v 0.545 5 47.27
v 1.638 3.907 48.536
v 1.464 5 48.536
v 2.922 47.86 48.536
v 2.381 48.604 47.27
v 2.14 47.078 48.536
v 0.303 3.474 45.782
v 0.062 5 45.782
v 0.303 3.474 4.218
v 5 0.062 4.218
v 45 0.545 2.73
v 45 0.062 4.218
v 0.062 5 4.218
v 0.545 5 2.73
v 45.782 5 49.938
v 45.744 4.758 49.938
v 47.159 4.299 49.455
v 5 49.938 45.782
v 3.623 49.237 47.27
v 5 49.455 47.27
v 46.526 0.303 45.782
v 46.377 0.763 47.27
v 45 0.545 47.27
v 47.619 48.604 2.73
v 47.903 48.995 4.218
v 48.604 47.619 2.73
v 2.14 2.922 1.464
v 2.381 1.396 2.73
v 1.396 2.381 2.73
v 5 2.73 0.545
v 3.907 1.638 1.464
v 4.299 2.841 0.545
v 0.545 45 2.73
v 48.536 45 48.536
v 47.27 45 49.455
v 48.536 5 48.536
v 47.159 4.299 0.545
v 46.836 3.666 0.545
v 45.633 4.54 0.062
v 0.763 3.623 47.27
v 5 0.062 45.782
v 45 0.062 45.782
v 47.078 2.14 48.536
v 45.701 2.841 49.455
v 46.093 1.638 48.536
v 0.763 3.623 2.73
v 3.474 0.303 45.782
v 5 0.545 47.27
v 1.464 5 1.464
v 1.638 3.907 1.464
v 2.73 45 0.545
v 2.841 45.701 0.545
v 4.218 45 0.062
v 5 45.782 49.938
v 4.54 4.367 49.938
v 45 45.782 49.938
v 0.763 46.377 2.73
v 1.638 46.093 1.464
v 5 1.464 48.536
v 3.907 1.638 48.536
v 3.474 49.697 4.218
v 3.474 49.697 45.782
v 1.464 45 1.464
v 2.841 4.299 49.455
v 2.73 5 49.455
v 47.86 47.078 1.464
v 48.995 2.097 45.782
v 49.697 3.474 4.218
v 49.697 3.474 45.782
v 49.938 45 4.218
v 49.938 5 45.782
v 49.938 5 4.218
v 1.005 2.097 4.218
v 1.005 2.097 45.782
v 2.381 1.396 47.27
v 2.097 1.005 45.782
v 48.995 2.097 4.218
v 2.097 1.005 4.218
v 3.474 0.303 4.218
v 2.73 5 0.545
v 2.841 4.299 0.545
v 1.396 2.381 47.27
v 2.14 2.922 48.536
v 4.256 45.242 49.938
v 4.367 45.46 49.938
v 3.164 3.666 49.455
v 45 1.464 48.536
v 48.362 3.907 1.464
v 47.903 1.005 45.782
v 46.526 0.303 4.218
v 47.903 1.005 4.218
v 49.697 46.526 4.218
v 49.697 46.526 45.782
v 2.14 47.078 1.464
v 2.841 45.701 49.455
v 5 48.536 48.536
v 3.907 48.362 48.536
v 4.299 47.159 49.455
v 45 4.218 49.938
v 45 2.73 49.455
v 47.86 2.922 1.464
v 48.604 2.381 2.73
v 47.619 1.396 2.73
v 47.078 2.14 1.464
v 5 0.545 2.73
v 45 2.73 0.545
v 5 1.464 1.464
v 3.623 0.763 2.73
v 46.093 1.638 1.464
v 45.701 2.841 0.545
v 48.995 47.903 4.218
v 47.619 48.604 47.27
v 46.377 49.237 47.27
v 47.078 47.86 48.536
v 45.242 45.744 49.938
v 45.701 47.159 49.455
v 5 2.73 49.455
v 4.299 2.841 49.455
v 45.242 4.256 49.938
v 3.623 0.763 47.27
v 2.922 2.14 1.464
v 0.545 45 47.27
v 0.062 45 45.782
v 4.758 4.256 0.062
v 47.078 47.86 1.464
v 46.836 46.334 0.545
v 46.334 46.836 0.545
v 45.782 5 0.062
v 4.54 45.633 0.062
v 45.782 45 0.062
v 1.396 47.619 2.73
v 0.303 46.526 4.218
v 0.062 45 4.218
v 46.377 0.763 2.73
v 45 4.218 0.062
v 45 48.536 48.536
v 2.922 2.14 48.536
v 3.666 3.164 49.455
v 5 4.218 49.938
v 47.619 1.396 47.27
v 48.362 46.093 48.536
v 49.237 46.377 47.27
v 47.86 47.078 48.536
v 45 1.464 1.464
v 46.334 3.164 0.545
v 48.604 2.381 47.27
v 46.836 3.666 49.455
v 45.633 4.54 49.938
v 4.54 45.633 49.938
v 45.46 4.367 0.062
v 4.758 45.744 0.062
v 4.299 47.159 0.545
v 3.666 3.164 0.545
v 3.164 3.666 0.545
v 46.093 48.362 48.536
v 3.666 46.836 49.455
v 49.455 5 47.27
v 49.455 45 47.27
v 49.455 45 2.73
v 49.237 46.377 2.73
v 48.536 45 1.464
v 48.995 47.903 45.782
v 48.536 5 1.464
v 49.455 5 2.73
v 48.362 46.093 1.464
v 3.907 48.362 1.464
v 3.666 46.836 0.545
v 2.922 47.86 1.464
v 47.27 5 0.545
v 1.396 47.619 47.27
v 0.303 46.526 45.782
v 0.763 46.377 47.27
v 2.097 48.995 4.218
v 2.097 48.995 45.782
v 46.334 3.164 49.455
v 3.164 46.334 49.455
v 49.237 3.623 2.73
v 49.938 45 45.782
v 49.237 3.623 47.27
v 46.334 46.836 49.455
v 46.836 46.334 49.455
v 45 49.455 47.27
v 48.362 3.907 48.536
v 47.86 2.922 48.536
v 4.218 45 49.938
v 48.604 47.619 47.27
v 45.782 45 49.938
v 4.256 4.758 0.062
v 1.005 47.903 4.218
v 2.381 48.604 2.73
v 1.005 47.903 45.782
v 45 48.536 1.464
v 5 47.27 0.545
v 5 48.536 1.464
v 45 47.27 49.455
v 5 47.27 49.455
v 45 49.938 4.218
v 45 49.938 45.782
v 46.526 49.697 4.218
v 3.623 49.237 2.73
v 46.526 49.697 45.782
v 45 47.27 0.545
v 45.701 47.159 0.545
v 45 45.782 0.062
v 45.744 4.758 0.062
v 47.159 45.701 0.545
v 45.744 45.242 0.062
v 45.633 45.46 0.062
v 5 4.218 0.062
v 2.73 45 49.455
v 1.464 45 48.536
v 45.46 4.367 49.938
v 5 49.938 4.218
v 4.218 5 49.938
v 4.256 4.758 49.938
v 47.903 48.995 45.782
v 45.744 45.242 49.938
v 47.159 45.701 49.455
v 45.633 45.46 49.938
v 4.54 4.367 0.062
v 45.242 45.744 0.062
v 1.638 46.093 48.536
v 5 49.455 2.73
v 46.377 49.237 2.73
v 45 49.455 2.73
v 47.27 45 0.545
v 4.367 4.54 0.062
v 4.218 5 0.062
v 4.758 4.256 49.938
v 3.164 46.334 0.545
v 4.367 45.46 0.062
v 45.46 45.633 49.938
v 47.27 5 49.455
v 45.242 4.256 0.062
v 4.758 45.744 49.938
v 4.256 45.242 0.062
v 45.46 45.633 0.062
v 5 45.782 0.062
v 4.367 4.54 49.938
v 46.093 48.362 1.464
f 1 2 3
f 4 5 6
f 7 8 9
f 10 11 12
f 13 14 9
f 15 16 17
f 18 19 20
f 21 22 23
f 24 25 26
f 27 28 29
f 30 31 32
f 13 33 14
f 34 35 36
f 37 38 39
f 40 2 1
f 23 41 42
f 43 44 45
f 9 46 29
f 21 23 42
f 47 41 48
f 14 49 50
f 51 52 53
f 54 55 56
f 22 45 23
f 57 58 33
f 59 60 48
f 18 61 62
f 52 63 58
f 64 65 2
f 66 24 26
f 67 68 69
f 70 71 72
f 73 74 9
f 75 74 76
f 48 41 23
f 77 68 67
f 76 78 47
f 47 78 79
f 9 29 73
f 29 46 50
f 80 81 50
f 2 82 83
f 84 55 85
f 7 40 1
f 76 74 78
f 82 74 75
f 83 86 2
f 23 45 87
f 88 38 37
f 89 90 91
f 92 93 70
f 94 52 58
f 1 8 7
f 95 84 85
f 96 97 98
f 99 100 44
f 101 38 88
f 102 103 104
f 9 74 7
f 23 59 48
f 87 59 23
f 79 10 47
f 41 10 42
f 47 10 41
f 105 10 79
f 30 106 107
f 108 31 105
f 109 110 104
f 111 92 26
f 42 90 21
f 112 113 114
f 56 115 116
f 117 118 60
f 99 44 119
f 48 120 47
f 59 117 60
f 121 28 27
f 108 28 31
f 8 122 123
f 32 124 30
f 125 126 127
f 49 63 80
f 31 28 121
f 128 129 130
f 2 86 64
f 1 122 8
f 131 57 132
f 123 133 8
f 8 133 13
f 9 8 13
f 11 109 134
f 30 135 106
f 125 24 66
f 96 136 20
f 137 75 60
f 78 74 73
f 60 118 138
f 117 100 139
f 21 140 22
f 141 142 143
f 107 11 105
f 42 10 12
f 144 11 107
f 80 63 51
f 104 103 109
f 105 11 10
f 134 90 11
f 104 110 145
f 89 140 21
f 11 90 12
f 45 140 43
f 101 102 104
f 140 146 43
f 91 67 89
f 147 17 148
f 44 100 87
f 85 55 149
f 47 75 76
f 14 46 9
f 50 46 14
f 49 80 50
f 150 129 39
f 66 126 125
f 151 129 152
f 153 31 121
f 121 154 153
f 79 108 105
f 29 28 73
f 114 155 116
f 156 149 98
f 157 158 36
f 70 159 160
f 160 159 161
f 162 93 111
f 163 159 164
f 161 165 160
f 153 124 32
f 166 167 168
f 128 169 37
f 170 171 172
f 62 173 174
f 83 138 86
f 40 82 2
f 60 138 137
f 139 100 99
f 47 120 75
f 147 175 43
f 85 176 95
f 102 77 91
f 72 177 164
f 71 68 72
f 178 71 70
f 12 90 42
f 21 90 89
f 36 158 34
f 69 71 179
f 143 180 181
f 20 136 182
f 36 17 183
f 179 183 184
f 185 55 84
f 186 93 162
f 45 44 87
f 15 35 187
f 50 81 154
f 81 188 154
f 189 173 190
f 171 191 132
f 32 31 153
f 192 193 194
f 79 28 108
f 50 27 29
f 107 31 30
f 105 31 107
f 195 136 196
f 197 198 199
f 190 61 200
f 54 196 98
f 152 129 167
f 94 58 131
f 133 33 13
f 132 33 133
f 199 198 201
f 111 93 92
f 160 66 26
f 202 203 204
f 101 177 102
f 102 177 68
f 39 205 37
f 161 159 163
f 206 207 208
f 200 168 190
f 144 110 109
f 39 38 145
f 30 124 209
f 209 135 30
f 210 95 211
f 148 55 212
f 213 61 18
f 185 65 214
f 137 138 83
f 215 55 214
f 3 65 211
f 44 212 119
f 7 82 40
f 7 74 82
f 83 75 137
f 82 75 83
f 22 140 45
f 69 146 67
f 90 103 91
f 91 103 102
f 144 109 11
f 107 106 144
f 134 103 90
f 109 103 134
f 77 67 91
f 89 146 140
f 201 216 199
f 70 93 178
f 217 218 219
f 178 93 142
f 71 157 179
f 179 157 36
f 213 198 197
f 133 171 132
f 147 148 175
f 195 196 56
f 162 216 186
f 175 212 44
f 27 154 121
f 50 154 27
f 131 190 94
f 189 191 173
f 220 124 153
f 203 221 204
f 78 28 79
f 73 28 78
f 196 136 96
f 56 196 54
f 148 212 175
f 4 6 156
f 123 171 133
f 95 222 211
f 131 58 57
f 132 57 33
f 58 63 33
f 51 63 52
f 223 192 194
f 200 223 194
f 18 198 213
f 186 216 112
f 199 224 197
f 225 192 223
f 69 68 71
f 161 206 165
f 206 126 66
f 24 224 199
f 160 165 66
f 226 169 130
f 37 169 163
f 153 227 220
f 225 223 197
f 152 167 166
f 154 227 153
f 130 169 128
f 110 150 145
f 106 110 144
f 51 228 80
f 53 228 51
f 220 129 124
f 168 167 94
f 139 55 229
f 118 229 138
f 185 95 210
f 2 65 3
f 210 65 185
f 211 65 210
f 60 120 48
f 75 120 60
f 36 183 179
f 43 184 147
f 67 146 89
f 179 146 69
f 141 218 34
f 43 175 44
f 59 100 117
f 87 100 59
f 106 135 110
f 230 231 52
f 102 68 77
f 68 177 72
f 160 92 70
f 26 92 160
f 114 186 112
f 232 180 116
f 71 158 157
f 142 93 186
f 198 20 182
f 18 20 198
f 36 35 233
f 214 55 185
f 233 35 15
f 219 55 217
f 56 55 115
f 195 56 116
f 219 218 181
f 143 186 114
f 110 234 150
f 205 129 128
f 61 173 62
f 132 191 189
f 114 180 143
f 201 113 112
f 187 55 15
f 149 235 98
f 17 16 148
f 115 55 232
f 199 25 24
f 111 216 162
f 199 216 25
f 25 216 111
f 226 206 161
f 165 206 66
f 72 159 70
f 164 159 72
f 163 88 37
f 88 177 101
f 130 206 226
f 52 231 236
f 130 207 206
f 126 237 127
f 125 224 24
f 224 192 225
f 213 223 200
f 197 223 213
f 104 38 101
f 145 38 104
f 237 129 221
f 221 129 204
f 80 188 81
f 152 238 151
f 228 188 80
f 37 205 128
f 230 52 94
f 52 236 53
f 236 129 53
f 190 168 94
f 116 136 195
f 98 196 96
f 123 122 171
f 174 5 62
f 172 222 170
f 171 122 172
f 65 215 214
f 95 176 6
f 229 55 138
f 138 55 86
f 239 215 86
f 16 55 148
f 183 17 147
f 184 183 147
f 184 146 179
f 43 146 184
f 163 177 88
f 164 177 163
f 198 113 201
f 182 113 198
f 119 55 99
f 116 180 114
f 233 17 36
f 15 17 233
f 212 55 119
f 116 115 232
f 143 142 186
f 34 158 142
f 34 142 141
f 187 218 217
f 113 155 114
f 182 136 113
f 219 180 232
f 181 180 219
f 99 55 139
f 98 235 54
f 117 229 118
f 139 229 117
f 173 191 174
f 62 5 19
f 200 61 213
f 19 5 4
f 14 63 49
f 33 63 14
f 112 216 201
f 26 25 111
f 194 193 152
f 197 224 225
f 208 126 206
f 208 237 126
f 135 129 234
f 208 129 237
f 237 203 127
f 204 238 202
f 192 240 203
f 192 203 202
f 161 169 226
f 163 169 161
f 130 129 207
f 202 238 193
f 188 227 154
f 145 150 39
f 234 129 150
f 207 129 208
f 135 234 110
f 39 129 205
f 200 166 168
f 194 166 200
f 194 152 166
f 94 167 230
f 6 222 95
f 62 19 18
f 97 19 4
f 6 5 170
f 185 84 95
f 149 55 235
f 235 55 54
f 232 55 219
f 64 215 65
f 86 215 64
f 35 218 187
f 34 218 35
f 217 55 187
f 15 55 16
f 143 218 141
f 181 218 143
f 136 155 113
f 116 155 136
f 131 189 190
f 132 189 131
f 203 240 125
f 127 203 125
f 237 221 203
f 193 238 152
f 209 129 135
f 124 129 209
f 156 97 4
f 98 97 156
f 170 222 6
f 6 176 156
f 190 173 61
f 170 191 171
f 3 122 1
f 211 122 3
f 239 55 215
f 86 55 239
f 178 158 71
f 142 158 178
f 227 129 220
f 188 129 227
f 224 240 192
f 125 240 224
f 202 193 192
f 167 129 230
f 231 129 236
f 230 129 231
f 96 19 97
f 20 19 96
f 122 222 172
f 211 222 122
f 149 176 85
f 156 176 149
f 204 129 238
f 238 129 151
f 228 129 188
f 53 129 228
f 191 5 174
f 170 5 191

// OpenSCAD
module roundedCube(size, r) {
	hull() {
		translate([r, r, r]) sphere(r);
		translate([size[0] - r, r, r]) sphere(r);
		translate([size[0] - r, size[1] - r, r]) sphere(r);
		translate([r, size[1] - r, r]) sphere(r);
		translate([r, r, size[2] - r]) sphere(r);
		translate([size[0] - r, r, size[2] - r]) sphere(r);
		translate([size[0] - r, size[1] - r, size[2] - r]) sphere(r);
		translate([r, size[1] - r, size[2] - r]) sphere(r);
	}
}

$fn = 20;
roundedCube([50, 50, 50], 5);
